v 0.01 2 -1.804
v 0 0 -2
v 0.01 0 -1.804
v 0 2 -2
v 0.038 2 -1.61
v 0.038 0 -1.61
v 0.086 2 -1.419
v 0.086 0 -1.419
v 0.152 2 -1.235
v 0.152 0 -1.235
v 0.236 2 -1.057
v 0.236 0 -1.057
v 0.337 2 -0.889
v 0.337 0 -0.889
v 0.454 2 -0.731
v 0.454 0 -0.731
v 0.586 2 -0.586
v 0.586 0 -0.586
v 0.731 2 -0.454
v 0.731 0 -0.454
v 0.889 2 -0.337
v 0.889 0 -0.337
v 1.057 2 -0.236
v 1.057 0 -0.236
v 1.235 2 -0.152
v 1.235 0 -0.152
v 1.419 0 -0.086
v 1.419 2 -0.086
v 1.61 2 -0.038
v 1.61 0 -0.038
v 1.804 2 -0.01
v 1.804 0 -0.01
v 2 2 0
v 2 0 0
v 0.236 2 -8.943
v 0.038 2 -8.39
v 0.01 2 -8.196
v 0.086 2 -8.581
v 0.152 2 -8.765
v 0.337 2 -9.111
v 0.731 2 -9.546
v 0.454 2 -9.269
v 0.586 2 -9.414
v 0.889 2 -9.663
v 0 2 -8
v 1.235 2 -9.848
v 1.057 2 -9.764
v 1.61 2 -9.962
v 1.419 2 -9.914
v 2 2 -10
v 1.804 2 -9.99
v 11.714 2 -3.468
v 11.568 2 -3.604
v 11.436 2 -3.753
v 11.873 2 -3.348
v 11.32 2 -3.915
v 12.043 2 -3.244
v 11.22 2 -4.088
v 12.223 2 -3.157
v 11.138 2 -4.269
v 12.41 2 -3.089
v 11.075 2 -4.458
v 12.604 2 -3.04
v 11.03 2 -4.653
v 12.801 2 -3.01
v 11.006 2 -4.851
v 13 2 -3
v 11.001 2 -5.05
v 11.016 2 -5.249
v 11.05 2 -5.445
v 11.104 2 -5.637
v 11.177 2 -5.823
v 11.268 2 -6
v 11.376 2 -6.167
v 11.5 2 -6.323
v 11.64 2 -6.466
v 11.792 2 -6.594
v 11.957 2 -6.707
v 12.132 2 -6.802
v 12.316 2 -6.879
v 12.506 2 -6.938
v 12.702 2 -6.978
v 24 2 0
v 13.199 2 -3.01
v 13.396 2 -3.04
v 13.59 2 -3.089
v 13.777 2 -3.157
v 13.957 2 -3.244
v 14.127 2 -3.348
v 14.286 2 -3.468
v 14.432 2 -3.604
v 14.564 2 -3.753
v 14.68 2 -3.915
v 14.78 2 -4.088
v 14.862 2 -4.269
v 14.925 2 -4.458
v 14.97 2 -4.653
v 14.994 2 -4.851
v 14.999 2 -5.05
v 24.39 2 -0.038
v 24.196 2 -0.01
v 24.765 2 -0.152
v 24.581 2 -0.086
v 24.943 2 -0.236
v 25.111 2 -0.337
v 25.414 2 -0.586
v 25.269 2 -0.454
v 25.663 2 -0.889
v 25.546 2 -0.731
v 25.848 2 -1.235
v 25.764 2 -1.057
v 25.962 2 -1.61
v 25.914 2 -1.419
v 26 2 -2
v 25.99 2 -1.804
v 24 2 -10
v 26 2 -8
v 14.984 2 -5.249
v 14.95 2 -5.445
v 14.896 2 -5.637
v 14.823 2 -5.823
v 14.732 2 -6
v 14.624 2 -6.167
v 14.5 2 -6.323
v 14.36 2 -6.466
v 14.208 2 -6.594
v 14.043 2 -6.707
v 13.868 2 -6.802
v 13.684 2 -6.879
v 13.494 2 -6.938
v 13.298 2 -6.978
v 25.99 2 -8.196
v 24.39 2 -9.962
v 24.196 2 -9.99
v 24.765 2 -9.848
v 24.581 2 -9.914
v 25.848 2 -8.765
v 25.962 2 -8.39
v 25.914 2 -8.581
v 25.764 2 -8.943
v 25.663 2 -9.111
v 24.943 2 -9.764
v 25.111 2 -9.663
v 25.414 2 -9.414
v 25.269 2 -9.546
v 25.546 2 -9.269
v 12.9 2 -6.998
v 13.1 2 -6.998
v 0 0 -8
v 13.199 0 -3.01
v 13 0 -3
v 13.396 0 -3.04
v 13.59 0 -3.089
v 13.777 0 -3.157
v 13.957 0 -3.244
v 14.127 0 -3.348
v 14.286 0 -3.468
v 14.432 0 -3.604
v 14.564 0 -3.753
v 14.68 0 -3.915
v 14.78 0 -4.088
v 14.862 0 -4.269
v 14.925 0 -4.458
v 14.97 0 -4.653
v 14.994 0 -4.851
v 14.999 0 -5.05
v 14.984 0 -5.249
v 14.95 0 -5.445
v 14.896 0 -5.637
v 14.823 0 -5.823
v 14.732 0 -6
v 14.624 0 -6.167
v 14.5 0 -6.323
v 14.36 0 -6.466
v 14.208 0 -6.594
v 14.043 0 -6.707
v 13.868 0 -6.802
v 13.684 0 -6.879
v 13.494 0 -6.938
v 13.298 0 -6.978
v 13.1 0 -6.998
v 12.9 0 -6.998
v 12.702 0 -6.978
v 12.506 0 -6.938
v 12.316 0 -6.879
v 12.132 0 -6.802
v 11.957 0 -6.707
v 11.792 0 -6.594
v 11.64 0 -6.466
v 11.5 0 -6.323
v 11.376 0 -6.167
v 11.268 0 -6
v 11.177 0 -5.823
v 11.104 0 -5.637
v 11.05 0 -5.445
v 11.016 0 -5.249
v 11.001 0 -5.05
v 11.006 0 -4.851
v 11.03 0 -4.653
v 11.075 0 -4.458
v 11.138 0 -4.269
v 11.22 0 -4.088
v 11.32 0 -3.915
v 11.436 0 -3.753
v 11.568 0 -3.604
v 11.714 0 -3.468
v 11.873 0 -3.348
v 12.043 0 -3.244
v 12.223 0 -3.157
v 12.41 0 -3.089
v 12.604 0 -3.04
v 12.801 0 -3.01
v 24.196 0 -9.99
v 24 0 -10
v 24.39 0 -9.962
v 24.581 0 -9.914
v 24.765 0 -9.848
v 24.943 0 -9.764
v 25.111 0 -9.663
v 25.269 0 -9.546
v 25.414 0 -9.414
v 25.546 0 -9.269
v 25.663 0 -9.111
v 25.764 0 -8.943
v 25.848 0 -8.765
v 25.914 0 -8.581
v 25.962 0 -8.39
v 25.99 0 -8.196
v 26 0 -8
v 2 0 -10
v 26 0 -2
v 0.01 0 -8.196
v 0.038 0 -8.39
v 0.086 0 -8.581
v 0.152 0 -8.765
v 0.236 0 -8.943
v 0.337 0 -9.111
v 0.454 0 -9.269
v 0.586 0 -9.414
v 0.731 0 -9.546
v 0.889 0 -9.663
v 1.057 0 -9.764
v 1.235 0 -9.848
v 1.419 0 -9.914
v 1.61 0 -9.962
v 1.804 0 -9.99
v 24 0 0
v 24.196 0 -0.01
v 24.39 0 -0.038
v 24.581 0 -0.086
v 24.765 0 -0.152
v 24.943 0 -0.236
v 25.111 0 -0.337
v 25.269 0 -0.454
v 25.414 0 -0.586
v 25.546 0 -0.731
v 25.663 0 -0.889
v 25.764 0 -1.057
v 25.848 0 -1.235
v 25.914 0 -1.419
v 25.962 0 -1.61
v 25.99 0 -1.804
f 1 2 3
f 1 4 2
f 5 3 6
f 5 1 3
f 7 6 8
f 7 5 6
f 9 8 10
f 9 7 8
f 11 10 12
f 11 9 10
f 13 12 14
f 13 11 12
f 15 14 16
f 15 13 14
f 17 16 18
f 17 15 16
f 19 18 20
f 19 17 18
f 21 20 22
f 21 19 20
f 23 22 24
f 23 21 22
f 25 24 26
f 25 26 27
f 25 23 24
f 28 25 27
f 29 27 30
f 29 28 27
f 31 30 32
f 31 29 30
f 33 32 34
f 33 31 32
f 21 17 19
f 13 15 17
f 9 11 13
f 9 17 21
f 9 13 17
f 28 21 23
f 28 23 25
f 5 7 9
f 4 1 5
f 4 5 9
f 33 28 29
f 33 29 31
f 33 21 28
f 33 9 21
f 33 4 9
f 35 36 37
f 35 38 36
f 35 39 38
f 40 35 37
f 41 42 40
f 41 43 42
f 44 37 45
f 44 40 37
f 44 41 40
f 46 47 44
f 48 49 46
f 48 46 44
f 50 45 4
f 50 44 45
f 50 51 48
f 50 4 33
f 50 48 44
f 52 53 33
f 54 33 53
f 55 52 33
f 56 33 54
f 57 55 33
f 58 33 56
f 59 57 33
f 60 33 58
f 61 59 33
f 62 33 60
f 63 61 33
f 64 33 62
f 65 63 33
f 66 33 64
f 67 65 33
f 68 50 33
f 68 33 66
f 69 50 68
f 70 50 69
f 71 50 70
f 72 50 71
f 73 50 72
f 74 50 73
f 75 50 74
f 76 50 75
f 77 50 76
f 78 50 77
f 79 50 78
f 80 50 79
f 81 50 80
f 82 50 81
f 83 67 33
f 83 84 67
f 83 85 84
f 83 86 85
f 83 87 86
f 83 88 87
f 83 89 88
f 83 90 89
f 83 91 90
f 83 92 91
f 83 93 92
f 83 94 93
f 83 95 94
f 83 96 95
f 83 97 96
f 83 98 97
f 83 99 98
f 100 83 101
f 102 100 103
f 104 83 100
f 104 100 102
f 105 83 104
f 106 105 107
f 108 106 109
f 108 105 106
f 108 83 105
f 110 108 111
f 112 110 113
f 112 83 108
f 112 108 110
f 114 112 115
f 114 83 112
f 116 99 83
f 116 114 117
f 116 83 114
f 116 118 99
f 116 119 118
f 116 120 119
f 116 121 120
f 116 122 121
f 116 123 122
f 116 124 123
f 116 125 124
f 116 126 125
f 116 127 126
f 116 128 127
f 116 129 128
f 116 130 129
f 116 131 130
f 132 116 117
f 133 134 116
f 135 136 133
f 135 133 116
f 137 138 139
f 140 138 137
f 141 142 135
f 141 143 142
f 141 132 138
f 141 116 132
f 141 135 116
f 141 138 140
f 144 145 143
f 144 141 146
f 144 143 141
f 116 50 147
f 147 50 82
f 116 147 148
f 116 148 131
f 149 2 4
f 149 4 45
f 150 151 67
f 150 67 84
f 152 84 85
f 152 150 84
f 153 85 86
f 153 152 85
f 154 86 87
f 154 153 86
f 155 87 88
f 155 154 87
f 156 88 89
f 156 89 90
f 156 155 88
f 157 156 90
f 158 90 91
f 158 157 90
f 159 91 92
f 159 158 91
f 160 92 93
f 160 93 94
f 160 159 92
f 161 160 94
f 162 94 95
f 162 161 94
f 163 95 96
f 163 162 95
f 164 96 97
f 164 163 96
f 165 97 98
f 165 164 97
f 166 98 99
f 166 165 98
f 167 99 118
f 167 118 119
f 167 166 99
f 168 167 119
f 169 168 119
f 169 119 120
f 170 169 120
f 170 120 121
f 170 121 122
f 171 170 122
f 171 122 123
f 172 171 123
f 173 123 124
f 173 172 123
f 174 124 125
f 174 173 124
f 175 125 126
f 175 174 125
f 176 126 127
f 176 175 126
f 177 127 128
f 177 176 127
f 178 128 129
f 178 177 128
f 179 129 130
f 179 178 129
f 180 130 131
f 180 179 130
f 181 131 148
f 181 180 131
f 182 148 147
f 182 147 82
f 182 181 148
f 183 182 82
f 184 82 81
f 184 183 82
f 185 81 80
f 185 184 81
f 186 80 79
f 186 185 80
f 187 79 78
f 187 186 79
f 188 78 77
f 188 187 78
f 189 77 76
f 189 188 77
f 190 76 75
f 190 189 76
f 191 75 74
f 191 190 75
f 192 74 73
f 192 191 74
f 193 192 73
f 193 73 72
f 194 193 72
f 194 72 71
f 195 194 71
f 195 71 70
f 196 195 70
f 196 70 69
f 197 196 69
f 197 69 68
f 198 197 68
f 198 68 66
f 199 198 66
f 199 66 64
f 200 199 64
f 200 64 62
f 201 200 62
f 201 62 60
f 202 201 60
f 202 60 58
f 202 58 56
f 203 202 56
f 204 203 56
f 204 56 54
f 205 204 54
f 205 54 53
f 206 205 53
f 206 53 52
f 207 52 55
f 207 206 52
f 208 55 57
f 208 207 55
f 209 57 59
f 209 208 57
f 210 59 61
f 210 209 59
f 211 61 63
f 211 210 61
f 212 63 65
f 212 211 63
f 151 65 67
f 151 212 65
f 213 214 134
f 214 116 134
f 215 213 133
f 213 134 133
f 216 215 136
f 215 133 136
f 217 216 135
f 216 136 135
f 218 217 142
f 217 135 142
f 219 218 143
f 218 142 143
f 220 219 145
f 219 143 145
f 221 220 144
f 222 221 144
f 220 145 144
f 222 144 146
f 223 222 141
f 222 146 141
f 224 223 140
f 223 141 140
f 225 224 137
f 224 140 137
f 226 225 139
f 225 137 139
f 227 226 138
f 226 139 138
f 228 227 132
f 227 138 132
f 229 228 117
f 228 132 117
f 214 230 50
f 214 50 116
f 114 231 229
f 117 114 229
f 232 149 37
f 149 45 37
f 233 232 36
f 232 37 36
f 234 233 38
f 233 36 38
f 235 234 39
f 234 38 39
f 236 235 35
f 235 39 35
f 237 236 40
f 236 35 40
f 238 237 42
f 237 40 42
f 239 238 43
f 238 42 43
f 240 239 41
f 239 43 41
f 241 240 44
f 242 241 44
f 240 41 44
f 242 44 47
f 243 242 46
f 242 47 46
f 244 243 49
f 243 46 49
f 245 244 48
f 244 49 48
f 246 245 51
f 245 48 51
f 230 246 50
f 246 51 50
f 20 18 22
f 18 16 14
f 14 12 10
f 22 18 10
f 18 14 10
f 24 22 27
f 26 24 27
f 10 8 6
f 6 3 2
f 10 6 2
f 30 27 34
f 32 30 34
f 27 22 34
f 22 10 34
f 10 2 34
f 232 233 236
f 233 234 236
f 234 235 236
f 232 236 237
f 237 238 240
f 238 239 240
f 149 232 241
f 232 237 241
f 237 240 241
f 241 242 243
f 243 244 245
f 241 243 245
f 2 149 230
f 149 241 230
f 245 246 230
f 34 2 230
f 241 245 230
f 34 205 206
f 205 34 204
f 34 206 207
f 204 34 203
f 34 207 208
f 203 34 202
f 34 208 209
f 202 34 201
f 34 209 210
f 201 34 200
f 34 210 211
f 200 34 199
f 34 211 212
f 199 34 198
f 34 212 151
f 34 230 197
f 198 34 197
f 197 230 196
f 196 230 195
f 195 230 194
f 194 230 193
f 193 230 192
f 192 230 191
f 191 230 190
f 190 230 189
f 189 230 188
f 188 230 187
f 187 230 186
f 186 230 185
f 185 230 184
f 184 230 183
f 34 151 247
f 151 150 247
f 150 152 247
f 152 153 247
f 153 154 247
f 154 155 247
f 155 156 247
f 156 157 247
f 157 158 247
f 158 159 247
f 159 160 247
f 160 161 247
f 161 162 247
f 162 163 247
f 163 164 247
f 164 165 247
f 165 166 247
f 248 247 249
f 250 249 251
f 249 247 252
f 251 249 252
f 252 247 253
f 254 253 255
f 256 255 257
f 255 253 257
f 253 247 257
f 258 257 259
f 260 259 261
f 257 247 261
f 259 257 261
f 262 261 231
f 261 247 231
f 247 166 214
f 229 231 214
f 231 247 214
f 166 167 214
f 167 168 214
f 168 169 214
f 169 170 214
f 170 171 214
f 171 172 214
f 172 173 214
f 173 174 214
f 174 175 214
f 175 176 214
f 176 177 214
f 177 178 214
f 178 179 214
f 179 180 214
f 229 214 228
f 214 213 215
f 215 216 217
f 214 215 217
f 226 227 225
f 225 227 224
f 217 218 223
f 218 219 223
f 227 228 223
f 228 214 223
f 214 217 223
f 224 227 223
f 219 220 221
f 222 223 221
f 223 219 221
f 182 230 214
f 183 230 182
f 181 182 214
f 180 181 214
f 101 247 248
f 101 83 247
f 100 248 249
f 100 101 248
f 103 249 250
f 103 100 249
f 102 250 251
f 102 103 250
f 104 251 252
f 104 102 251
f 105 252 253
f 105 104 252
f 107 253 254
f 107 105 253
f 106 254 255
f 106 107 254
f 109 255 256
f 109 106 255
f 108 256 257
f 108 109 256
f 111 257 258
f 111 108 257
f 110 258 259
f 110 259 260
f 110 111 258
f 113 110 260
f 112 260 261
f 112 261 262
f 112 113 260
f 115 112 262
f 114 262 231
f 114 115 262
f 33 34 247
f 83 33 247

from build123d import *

# Parameters (mm, degrees)
SKETCH1_W           = 26
SKETCH1_H           = 10
SKETCH1_R           = 2
BOSS_EXTRUDE1_DEPTH = 2
FILLET1_R           = 2


with BuildPart() as part:
    # Sketch1 → Boss-Extrude1 (new body)
    with BuildSketch(Plane(origin=(0, 0, 0), x_dir=(1, 0, 0), z_dir=(0, 1, 0))):
        with Locations((13, 5)):
            Rectangle(SKETCH1_W, SKETCH1_H)
        with Locations(Location((13, 5, 0), (0, 0, 270))):
            Circle(SKETCH1_R, mode=Mode.SUBTRACT)
    extrude(amount=BOSS_EXTRUDE1_DEPTH)

    # Fillet1
    fillet1_edges = [part.edges().sort_by_distance(p)[0] for p in [
        (0, 1, -10),
        (26, 1, -10),
        (26, 1, 0),
        (0, 1, 0),
    ]]
    fillet(fillet1_edges, radius=FILLET1_R)


solid = part.part
